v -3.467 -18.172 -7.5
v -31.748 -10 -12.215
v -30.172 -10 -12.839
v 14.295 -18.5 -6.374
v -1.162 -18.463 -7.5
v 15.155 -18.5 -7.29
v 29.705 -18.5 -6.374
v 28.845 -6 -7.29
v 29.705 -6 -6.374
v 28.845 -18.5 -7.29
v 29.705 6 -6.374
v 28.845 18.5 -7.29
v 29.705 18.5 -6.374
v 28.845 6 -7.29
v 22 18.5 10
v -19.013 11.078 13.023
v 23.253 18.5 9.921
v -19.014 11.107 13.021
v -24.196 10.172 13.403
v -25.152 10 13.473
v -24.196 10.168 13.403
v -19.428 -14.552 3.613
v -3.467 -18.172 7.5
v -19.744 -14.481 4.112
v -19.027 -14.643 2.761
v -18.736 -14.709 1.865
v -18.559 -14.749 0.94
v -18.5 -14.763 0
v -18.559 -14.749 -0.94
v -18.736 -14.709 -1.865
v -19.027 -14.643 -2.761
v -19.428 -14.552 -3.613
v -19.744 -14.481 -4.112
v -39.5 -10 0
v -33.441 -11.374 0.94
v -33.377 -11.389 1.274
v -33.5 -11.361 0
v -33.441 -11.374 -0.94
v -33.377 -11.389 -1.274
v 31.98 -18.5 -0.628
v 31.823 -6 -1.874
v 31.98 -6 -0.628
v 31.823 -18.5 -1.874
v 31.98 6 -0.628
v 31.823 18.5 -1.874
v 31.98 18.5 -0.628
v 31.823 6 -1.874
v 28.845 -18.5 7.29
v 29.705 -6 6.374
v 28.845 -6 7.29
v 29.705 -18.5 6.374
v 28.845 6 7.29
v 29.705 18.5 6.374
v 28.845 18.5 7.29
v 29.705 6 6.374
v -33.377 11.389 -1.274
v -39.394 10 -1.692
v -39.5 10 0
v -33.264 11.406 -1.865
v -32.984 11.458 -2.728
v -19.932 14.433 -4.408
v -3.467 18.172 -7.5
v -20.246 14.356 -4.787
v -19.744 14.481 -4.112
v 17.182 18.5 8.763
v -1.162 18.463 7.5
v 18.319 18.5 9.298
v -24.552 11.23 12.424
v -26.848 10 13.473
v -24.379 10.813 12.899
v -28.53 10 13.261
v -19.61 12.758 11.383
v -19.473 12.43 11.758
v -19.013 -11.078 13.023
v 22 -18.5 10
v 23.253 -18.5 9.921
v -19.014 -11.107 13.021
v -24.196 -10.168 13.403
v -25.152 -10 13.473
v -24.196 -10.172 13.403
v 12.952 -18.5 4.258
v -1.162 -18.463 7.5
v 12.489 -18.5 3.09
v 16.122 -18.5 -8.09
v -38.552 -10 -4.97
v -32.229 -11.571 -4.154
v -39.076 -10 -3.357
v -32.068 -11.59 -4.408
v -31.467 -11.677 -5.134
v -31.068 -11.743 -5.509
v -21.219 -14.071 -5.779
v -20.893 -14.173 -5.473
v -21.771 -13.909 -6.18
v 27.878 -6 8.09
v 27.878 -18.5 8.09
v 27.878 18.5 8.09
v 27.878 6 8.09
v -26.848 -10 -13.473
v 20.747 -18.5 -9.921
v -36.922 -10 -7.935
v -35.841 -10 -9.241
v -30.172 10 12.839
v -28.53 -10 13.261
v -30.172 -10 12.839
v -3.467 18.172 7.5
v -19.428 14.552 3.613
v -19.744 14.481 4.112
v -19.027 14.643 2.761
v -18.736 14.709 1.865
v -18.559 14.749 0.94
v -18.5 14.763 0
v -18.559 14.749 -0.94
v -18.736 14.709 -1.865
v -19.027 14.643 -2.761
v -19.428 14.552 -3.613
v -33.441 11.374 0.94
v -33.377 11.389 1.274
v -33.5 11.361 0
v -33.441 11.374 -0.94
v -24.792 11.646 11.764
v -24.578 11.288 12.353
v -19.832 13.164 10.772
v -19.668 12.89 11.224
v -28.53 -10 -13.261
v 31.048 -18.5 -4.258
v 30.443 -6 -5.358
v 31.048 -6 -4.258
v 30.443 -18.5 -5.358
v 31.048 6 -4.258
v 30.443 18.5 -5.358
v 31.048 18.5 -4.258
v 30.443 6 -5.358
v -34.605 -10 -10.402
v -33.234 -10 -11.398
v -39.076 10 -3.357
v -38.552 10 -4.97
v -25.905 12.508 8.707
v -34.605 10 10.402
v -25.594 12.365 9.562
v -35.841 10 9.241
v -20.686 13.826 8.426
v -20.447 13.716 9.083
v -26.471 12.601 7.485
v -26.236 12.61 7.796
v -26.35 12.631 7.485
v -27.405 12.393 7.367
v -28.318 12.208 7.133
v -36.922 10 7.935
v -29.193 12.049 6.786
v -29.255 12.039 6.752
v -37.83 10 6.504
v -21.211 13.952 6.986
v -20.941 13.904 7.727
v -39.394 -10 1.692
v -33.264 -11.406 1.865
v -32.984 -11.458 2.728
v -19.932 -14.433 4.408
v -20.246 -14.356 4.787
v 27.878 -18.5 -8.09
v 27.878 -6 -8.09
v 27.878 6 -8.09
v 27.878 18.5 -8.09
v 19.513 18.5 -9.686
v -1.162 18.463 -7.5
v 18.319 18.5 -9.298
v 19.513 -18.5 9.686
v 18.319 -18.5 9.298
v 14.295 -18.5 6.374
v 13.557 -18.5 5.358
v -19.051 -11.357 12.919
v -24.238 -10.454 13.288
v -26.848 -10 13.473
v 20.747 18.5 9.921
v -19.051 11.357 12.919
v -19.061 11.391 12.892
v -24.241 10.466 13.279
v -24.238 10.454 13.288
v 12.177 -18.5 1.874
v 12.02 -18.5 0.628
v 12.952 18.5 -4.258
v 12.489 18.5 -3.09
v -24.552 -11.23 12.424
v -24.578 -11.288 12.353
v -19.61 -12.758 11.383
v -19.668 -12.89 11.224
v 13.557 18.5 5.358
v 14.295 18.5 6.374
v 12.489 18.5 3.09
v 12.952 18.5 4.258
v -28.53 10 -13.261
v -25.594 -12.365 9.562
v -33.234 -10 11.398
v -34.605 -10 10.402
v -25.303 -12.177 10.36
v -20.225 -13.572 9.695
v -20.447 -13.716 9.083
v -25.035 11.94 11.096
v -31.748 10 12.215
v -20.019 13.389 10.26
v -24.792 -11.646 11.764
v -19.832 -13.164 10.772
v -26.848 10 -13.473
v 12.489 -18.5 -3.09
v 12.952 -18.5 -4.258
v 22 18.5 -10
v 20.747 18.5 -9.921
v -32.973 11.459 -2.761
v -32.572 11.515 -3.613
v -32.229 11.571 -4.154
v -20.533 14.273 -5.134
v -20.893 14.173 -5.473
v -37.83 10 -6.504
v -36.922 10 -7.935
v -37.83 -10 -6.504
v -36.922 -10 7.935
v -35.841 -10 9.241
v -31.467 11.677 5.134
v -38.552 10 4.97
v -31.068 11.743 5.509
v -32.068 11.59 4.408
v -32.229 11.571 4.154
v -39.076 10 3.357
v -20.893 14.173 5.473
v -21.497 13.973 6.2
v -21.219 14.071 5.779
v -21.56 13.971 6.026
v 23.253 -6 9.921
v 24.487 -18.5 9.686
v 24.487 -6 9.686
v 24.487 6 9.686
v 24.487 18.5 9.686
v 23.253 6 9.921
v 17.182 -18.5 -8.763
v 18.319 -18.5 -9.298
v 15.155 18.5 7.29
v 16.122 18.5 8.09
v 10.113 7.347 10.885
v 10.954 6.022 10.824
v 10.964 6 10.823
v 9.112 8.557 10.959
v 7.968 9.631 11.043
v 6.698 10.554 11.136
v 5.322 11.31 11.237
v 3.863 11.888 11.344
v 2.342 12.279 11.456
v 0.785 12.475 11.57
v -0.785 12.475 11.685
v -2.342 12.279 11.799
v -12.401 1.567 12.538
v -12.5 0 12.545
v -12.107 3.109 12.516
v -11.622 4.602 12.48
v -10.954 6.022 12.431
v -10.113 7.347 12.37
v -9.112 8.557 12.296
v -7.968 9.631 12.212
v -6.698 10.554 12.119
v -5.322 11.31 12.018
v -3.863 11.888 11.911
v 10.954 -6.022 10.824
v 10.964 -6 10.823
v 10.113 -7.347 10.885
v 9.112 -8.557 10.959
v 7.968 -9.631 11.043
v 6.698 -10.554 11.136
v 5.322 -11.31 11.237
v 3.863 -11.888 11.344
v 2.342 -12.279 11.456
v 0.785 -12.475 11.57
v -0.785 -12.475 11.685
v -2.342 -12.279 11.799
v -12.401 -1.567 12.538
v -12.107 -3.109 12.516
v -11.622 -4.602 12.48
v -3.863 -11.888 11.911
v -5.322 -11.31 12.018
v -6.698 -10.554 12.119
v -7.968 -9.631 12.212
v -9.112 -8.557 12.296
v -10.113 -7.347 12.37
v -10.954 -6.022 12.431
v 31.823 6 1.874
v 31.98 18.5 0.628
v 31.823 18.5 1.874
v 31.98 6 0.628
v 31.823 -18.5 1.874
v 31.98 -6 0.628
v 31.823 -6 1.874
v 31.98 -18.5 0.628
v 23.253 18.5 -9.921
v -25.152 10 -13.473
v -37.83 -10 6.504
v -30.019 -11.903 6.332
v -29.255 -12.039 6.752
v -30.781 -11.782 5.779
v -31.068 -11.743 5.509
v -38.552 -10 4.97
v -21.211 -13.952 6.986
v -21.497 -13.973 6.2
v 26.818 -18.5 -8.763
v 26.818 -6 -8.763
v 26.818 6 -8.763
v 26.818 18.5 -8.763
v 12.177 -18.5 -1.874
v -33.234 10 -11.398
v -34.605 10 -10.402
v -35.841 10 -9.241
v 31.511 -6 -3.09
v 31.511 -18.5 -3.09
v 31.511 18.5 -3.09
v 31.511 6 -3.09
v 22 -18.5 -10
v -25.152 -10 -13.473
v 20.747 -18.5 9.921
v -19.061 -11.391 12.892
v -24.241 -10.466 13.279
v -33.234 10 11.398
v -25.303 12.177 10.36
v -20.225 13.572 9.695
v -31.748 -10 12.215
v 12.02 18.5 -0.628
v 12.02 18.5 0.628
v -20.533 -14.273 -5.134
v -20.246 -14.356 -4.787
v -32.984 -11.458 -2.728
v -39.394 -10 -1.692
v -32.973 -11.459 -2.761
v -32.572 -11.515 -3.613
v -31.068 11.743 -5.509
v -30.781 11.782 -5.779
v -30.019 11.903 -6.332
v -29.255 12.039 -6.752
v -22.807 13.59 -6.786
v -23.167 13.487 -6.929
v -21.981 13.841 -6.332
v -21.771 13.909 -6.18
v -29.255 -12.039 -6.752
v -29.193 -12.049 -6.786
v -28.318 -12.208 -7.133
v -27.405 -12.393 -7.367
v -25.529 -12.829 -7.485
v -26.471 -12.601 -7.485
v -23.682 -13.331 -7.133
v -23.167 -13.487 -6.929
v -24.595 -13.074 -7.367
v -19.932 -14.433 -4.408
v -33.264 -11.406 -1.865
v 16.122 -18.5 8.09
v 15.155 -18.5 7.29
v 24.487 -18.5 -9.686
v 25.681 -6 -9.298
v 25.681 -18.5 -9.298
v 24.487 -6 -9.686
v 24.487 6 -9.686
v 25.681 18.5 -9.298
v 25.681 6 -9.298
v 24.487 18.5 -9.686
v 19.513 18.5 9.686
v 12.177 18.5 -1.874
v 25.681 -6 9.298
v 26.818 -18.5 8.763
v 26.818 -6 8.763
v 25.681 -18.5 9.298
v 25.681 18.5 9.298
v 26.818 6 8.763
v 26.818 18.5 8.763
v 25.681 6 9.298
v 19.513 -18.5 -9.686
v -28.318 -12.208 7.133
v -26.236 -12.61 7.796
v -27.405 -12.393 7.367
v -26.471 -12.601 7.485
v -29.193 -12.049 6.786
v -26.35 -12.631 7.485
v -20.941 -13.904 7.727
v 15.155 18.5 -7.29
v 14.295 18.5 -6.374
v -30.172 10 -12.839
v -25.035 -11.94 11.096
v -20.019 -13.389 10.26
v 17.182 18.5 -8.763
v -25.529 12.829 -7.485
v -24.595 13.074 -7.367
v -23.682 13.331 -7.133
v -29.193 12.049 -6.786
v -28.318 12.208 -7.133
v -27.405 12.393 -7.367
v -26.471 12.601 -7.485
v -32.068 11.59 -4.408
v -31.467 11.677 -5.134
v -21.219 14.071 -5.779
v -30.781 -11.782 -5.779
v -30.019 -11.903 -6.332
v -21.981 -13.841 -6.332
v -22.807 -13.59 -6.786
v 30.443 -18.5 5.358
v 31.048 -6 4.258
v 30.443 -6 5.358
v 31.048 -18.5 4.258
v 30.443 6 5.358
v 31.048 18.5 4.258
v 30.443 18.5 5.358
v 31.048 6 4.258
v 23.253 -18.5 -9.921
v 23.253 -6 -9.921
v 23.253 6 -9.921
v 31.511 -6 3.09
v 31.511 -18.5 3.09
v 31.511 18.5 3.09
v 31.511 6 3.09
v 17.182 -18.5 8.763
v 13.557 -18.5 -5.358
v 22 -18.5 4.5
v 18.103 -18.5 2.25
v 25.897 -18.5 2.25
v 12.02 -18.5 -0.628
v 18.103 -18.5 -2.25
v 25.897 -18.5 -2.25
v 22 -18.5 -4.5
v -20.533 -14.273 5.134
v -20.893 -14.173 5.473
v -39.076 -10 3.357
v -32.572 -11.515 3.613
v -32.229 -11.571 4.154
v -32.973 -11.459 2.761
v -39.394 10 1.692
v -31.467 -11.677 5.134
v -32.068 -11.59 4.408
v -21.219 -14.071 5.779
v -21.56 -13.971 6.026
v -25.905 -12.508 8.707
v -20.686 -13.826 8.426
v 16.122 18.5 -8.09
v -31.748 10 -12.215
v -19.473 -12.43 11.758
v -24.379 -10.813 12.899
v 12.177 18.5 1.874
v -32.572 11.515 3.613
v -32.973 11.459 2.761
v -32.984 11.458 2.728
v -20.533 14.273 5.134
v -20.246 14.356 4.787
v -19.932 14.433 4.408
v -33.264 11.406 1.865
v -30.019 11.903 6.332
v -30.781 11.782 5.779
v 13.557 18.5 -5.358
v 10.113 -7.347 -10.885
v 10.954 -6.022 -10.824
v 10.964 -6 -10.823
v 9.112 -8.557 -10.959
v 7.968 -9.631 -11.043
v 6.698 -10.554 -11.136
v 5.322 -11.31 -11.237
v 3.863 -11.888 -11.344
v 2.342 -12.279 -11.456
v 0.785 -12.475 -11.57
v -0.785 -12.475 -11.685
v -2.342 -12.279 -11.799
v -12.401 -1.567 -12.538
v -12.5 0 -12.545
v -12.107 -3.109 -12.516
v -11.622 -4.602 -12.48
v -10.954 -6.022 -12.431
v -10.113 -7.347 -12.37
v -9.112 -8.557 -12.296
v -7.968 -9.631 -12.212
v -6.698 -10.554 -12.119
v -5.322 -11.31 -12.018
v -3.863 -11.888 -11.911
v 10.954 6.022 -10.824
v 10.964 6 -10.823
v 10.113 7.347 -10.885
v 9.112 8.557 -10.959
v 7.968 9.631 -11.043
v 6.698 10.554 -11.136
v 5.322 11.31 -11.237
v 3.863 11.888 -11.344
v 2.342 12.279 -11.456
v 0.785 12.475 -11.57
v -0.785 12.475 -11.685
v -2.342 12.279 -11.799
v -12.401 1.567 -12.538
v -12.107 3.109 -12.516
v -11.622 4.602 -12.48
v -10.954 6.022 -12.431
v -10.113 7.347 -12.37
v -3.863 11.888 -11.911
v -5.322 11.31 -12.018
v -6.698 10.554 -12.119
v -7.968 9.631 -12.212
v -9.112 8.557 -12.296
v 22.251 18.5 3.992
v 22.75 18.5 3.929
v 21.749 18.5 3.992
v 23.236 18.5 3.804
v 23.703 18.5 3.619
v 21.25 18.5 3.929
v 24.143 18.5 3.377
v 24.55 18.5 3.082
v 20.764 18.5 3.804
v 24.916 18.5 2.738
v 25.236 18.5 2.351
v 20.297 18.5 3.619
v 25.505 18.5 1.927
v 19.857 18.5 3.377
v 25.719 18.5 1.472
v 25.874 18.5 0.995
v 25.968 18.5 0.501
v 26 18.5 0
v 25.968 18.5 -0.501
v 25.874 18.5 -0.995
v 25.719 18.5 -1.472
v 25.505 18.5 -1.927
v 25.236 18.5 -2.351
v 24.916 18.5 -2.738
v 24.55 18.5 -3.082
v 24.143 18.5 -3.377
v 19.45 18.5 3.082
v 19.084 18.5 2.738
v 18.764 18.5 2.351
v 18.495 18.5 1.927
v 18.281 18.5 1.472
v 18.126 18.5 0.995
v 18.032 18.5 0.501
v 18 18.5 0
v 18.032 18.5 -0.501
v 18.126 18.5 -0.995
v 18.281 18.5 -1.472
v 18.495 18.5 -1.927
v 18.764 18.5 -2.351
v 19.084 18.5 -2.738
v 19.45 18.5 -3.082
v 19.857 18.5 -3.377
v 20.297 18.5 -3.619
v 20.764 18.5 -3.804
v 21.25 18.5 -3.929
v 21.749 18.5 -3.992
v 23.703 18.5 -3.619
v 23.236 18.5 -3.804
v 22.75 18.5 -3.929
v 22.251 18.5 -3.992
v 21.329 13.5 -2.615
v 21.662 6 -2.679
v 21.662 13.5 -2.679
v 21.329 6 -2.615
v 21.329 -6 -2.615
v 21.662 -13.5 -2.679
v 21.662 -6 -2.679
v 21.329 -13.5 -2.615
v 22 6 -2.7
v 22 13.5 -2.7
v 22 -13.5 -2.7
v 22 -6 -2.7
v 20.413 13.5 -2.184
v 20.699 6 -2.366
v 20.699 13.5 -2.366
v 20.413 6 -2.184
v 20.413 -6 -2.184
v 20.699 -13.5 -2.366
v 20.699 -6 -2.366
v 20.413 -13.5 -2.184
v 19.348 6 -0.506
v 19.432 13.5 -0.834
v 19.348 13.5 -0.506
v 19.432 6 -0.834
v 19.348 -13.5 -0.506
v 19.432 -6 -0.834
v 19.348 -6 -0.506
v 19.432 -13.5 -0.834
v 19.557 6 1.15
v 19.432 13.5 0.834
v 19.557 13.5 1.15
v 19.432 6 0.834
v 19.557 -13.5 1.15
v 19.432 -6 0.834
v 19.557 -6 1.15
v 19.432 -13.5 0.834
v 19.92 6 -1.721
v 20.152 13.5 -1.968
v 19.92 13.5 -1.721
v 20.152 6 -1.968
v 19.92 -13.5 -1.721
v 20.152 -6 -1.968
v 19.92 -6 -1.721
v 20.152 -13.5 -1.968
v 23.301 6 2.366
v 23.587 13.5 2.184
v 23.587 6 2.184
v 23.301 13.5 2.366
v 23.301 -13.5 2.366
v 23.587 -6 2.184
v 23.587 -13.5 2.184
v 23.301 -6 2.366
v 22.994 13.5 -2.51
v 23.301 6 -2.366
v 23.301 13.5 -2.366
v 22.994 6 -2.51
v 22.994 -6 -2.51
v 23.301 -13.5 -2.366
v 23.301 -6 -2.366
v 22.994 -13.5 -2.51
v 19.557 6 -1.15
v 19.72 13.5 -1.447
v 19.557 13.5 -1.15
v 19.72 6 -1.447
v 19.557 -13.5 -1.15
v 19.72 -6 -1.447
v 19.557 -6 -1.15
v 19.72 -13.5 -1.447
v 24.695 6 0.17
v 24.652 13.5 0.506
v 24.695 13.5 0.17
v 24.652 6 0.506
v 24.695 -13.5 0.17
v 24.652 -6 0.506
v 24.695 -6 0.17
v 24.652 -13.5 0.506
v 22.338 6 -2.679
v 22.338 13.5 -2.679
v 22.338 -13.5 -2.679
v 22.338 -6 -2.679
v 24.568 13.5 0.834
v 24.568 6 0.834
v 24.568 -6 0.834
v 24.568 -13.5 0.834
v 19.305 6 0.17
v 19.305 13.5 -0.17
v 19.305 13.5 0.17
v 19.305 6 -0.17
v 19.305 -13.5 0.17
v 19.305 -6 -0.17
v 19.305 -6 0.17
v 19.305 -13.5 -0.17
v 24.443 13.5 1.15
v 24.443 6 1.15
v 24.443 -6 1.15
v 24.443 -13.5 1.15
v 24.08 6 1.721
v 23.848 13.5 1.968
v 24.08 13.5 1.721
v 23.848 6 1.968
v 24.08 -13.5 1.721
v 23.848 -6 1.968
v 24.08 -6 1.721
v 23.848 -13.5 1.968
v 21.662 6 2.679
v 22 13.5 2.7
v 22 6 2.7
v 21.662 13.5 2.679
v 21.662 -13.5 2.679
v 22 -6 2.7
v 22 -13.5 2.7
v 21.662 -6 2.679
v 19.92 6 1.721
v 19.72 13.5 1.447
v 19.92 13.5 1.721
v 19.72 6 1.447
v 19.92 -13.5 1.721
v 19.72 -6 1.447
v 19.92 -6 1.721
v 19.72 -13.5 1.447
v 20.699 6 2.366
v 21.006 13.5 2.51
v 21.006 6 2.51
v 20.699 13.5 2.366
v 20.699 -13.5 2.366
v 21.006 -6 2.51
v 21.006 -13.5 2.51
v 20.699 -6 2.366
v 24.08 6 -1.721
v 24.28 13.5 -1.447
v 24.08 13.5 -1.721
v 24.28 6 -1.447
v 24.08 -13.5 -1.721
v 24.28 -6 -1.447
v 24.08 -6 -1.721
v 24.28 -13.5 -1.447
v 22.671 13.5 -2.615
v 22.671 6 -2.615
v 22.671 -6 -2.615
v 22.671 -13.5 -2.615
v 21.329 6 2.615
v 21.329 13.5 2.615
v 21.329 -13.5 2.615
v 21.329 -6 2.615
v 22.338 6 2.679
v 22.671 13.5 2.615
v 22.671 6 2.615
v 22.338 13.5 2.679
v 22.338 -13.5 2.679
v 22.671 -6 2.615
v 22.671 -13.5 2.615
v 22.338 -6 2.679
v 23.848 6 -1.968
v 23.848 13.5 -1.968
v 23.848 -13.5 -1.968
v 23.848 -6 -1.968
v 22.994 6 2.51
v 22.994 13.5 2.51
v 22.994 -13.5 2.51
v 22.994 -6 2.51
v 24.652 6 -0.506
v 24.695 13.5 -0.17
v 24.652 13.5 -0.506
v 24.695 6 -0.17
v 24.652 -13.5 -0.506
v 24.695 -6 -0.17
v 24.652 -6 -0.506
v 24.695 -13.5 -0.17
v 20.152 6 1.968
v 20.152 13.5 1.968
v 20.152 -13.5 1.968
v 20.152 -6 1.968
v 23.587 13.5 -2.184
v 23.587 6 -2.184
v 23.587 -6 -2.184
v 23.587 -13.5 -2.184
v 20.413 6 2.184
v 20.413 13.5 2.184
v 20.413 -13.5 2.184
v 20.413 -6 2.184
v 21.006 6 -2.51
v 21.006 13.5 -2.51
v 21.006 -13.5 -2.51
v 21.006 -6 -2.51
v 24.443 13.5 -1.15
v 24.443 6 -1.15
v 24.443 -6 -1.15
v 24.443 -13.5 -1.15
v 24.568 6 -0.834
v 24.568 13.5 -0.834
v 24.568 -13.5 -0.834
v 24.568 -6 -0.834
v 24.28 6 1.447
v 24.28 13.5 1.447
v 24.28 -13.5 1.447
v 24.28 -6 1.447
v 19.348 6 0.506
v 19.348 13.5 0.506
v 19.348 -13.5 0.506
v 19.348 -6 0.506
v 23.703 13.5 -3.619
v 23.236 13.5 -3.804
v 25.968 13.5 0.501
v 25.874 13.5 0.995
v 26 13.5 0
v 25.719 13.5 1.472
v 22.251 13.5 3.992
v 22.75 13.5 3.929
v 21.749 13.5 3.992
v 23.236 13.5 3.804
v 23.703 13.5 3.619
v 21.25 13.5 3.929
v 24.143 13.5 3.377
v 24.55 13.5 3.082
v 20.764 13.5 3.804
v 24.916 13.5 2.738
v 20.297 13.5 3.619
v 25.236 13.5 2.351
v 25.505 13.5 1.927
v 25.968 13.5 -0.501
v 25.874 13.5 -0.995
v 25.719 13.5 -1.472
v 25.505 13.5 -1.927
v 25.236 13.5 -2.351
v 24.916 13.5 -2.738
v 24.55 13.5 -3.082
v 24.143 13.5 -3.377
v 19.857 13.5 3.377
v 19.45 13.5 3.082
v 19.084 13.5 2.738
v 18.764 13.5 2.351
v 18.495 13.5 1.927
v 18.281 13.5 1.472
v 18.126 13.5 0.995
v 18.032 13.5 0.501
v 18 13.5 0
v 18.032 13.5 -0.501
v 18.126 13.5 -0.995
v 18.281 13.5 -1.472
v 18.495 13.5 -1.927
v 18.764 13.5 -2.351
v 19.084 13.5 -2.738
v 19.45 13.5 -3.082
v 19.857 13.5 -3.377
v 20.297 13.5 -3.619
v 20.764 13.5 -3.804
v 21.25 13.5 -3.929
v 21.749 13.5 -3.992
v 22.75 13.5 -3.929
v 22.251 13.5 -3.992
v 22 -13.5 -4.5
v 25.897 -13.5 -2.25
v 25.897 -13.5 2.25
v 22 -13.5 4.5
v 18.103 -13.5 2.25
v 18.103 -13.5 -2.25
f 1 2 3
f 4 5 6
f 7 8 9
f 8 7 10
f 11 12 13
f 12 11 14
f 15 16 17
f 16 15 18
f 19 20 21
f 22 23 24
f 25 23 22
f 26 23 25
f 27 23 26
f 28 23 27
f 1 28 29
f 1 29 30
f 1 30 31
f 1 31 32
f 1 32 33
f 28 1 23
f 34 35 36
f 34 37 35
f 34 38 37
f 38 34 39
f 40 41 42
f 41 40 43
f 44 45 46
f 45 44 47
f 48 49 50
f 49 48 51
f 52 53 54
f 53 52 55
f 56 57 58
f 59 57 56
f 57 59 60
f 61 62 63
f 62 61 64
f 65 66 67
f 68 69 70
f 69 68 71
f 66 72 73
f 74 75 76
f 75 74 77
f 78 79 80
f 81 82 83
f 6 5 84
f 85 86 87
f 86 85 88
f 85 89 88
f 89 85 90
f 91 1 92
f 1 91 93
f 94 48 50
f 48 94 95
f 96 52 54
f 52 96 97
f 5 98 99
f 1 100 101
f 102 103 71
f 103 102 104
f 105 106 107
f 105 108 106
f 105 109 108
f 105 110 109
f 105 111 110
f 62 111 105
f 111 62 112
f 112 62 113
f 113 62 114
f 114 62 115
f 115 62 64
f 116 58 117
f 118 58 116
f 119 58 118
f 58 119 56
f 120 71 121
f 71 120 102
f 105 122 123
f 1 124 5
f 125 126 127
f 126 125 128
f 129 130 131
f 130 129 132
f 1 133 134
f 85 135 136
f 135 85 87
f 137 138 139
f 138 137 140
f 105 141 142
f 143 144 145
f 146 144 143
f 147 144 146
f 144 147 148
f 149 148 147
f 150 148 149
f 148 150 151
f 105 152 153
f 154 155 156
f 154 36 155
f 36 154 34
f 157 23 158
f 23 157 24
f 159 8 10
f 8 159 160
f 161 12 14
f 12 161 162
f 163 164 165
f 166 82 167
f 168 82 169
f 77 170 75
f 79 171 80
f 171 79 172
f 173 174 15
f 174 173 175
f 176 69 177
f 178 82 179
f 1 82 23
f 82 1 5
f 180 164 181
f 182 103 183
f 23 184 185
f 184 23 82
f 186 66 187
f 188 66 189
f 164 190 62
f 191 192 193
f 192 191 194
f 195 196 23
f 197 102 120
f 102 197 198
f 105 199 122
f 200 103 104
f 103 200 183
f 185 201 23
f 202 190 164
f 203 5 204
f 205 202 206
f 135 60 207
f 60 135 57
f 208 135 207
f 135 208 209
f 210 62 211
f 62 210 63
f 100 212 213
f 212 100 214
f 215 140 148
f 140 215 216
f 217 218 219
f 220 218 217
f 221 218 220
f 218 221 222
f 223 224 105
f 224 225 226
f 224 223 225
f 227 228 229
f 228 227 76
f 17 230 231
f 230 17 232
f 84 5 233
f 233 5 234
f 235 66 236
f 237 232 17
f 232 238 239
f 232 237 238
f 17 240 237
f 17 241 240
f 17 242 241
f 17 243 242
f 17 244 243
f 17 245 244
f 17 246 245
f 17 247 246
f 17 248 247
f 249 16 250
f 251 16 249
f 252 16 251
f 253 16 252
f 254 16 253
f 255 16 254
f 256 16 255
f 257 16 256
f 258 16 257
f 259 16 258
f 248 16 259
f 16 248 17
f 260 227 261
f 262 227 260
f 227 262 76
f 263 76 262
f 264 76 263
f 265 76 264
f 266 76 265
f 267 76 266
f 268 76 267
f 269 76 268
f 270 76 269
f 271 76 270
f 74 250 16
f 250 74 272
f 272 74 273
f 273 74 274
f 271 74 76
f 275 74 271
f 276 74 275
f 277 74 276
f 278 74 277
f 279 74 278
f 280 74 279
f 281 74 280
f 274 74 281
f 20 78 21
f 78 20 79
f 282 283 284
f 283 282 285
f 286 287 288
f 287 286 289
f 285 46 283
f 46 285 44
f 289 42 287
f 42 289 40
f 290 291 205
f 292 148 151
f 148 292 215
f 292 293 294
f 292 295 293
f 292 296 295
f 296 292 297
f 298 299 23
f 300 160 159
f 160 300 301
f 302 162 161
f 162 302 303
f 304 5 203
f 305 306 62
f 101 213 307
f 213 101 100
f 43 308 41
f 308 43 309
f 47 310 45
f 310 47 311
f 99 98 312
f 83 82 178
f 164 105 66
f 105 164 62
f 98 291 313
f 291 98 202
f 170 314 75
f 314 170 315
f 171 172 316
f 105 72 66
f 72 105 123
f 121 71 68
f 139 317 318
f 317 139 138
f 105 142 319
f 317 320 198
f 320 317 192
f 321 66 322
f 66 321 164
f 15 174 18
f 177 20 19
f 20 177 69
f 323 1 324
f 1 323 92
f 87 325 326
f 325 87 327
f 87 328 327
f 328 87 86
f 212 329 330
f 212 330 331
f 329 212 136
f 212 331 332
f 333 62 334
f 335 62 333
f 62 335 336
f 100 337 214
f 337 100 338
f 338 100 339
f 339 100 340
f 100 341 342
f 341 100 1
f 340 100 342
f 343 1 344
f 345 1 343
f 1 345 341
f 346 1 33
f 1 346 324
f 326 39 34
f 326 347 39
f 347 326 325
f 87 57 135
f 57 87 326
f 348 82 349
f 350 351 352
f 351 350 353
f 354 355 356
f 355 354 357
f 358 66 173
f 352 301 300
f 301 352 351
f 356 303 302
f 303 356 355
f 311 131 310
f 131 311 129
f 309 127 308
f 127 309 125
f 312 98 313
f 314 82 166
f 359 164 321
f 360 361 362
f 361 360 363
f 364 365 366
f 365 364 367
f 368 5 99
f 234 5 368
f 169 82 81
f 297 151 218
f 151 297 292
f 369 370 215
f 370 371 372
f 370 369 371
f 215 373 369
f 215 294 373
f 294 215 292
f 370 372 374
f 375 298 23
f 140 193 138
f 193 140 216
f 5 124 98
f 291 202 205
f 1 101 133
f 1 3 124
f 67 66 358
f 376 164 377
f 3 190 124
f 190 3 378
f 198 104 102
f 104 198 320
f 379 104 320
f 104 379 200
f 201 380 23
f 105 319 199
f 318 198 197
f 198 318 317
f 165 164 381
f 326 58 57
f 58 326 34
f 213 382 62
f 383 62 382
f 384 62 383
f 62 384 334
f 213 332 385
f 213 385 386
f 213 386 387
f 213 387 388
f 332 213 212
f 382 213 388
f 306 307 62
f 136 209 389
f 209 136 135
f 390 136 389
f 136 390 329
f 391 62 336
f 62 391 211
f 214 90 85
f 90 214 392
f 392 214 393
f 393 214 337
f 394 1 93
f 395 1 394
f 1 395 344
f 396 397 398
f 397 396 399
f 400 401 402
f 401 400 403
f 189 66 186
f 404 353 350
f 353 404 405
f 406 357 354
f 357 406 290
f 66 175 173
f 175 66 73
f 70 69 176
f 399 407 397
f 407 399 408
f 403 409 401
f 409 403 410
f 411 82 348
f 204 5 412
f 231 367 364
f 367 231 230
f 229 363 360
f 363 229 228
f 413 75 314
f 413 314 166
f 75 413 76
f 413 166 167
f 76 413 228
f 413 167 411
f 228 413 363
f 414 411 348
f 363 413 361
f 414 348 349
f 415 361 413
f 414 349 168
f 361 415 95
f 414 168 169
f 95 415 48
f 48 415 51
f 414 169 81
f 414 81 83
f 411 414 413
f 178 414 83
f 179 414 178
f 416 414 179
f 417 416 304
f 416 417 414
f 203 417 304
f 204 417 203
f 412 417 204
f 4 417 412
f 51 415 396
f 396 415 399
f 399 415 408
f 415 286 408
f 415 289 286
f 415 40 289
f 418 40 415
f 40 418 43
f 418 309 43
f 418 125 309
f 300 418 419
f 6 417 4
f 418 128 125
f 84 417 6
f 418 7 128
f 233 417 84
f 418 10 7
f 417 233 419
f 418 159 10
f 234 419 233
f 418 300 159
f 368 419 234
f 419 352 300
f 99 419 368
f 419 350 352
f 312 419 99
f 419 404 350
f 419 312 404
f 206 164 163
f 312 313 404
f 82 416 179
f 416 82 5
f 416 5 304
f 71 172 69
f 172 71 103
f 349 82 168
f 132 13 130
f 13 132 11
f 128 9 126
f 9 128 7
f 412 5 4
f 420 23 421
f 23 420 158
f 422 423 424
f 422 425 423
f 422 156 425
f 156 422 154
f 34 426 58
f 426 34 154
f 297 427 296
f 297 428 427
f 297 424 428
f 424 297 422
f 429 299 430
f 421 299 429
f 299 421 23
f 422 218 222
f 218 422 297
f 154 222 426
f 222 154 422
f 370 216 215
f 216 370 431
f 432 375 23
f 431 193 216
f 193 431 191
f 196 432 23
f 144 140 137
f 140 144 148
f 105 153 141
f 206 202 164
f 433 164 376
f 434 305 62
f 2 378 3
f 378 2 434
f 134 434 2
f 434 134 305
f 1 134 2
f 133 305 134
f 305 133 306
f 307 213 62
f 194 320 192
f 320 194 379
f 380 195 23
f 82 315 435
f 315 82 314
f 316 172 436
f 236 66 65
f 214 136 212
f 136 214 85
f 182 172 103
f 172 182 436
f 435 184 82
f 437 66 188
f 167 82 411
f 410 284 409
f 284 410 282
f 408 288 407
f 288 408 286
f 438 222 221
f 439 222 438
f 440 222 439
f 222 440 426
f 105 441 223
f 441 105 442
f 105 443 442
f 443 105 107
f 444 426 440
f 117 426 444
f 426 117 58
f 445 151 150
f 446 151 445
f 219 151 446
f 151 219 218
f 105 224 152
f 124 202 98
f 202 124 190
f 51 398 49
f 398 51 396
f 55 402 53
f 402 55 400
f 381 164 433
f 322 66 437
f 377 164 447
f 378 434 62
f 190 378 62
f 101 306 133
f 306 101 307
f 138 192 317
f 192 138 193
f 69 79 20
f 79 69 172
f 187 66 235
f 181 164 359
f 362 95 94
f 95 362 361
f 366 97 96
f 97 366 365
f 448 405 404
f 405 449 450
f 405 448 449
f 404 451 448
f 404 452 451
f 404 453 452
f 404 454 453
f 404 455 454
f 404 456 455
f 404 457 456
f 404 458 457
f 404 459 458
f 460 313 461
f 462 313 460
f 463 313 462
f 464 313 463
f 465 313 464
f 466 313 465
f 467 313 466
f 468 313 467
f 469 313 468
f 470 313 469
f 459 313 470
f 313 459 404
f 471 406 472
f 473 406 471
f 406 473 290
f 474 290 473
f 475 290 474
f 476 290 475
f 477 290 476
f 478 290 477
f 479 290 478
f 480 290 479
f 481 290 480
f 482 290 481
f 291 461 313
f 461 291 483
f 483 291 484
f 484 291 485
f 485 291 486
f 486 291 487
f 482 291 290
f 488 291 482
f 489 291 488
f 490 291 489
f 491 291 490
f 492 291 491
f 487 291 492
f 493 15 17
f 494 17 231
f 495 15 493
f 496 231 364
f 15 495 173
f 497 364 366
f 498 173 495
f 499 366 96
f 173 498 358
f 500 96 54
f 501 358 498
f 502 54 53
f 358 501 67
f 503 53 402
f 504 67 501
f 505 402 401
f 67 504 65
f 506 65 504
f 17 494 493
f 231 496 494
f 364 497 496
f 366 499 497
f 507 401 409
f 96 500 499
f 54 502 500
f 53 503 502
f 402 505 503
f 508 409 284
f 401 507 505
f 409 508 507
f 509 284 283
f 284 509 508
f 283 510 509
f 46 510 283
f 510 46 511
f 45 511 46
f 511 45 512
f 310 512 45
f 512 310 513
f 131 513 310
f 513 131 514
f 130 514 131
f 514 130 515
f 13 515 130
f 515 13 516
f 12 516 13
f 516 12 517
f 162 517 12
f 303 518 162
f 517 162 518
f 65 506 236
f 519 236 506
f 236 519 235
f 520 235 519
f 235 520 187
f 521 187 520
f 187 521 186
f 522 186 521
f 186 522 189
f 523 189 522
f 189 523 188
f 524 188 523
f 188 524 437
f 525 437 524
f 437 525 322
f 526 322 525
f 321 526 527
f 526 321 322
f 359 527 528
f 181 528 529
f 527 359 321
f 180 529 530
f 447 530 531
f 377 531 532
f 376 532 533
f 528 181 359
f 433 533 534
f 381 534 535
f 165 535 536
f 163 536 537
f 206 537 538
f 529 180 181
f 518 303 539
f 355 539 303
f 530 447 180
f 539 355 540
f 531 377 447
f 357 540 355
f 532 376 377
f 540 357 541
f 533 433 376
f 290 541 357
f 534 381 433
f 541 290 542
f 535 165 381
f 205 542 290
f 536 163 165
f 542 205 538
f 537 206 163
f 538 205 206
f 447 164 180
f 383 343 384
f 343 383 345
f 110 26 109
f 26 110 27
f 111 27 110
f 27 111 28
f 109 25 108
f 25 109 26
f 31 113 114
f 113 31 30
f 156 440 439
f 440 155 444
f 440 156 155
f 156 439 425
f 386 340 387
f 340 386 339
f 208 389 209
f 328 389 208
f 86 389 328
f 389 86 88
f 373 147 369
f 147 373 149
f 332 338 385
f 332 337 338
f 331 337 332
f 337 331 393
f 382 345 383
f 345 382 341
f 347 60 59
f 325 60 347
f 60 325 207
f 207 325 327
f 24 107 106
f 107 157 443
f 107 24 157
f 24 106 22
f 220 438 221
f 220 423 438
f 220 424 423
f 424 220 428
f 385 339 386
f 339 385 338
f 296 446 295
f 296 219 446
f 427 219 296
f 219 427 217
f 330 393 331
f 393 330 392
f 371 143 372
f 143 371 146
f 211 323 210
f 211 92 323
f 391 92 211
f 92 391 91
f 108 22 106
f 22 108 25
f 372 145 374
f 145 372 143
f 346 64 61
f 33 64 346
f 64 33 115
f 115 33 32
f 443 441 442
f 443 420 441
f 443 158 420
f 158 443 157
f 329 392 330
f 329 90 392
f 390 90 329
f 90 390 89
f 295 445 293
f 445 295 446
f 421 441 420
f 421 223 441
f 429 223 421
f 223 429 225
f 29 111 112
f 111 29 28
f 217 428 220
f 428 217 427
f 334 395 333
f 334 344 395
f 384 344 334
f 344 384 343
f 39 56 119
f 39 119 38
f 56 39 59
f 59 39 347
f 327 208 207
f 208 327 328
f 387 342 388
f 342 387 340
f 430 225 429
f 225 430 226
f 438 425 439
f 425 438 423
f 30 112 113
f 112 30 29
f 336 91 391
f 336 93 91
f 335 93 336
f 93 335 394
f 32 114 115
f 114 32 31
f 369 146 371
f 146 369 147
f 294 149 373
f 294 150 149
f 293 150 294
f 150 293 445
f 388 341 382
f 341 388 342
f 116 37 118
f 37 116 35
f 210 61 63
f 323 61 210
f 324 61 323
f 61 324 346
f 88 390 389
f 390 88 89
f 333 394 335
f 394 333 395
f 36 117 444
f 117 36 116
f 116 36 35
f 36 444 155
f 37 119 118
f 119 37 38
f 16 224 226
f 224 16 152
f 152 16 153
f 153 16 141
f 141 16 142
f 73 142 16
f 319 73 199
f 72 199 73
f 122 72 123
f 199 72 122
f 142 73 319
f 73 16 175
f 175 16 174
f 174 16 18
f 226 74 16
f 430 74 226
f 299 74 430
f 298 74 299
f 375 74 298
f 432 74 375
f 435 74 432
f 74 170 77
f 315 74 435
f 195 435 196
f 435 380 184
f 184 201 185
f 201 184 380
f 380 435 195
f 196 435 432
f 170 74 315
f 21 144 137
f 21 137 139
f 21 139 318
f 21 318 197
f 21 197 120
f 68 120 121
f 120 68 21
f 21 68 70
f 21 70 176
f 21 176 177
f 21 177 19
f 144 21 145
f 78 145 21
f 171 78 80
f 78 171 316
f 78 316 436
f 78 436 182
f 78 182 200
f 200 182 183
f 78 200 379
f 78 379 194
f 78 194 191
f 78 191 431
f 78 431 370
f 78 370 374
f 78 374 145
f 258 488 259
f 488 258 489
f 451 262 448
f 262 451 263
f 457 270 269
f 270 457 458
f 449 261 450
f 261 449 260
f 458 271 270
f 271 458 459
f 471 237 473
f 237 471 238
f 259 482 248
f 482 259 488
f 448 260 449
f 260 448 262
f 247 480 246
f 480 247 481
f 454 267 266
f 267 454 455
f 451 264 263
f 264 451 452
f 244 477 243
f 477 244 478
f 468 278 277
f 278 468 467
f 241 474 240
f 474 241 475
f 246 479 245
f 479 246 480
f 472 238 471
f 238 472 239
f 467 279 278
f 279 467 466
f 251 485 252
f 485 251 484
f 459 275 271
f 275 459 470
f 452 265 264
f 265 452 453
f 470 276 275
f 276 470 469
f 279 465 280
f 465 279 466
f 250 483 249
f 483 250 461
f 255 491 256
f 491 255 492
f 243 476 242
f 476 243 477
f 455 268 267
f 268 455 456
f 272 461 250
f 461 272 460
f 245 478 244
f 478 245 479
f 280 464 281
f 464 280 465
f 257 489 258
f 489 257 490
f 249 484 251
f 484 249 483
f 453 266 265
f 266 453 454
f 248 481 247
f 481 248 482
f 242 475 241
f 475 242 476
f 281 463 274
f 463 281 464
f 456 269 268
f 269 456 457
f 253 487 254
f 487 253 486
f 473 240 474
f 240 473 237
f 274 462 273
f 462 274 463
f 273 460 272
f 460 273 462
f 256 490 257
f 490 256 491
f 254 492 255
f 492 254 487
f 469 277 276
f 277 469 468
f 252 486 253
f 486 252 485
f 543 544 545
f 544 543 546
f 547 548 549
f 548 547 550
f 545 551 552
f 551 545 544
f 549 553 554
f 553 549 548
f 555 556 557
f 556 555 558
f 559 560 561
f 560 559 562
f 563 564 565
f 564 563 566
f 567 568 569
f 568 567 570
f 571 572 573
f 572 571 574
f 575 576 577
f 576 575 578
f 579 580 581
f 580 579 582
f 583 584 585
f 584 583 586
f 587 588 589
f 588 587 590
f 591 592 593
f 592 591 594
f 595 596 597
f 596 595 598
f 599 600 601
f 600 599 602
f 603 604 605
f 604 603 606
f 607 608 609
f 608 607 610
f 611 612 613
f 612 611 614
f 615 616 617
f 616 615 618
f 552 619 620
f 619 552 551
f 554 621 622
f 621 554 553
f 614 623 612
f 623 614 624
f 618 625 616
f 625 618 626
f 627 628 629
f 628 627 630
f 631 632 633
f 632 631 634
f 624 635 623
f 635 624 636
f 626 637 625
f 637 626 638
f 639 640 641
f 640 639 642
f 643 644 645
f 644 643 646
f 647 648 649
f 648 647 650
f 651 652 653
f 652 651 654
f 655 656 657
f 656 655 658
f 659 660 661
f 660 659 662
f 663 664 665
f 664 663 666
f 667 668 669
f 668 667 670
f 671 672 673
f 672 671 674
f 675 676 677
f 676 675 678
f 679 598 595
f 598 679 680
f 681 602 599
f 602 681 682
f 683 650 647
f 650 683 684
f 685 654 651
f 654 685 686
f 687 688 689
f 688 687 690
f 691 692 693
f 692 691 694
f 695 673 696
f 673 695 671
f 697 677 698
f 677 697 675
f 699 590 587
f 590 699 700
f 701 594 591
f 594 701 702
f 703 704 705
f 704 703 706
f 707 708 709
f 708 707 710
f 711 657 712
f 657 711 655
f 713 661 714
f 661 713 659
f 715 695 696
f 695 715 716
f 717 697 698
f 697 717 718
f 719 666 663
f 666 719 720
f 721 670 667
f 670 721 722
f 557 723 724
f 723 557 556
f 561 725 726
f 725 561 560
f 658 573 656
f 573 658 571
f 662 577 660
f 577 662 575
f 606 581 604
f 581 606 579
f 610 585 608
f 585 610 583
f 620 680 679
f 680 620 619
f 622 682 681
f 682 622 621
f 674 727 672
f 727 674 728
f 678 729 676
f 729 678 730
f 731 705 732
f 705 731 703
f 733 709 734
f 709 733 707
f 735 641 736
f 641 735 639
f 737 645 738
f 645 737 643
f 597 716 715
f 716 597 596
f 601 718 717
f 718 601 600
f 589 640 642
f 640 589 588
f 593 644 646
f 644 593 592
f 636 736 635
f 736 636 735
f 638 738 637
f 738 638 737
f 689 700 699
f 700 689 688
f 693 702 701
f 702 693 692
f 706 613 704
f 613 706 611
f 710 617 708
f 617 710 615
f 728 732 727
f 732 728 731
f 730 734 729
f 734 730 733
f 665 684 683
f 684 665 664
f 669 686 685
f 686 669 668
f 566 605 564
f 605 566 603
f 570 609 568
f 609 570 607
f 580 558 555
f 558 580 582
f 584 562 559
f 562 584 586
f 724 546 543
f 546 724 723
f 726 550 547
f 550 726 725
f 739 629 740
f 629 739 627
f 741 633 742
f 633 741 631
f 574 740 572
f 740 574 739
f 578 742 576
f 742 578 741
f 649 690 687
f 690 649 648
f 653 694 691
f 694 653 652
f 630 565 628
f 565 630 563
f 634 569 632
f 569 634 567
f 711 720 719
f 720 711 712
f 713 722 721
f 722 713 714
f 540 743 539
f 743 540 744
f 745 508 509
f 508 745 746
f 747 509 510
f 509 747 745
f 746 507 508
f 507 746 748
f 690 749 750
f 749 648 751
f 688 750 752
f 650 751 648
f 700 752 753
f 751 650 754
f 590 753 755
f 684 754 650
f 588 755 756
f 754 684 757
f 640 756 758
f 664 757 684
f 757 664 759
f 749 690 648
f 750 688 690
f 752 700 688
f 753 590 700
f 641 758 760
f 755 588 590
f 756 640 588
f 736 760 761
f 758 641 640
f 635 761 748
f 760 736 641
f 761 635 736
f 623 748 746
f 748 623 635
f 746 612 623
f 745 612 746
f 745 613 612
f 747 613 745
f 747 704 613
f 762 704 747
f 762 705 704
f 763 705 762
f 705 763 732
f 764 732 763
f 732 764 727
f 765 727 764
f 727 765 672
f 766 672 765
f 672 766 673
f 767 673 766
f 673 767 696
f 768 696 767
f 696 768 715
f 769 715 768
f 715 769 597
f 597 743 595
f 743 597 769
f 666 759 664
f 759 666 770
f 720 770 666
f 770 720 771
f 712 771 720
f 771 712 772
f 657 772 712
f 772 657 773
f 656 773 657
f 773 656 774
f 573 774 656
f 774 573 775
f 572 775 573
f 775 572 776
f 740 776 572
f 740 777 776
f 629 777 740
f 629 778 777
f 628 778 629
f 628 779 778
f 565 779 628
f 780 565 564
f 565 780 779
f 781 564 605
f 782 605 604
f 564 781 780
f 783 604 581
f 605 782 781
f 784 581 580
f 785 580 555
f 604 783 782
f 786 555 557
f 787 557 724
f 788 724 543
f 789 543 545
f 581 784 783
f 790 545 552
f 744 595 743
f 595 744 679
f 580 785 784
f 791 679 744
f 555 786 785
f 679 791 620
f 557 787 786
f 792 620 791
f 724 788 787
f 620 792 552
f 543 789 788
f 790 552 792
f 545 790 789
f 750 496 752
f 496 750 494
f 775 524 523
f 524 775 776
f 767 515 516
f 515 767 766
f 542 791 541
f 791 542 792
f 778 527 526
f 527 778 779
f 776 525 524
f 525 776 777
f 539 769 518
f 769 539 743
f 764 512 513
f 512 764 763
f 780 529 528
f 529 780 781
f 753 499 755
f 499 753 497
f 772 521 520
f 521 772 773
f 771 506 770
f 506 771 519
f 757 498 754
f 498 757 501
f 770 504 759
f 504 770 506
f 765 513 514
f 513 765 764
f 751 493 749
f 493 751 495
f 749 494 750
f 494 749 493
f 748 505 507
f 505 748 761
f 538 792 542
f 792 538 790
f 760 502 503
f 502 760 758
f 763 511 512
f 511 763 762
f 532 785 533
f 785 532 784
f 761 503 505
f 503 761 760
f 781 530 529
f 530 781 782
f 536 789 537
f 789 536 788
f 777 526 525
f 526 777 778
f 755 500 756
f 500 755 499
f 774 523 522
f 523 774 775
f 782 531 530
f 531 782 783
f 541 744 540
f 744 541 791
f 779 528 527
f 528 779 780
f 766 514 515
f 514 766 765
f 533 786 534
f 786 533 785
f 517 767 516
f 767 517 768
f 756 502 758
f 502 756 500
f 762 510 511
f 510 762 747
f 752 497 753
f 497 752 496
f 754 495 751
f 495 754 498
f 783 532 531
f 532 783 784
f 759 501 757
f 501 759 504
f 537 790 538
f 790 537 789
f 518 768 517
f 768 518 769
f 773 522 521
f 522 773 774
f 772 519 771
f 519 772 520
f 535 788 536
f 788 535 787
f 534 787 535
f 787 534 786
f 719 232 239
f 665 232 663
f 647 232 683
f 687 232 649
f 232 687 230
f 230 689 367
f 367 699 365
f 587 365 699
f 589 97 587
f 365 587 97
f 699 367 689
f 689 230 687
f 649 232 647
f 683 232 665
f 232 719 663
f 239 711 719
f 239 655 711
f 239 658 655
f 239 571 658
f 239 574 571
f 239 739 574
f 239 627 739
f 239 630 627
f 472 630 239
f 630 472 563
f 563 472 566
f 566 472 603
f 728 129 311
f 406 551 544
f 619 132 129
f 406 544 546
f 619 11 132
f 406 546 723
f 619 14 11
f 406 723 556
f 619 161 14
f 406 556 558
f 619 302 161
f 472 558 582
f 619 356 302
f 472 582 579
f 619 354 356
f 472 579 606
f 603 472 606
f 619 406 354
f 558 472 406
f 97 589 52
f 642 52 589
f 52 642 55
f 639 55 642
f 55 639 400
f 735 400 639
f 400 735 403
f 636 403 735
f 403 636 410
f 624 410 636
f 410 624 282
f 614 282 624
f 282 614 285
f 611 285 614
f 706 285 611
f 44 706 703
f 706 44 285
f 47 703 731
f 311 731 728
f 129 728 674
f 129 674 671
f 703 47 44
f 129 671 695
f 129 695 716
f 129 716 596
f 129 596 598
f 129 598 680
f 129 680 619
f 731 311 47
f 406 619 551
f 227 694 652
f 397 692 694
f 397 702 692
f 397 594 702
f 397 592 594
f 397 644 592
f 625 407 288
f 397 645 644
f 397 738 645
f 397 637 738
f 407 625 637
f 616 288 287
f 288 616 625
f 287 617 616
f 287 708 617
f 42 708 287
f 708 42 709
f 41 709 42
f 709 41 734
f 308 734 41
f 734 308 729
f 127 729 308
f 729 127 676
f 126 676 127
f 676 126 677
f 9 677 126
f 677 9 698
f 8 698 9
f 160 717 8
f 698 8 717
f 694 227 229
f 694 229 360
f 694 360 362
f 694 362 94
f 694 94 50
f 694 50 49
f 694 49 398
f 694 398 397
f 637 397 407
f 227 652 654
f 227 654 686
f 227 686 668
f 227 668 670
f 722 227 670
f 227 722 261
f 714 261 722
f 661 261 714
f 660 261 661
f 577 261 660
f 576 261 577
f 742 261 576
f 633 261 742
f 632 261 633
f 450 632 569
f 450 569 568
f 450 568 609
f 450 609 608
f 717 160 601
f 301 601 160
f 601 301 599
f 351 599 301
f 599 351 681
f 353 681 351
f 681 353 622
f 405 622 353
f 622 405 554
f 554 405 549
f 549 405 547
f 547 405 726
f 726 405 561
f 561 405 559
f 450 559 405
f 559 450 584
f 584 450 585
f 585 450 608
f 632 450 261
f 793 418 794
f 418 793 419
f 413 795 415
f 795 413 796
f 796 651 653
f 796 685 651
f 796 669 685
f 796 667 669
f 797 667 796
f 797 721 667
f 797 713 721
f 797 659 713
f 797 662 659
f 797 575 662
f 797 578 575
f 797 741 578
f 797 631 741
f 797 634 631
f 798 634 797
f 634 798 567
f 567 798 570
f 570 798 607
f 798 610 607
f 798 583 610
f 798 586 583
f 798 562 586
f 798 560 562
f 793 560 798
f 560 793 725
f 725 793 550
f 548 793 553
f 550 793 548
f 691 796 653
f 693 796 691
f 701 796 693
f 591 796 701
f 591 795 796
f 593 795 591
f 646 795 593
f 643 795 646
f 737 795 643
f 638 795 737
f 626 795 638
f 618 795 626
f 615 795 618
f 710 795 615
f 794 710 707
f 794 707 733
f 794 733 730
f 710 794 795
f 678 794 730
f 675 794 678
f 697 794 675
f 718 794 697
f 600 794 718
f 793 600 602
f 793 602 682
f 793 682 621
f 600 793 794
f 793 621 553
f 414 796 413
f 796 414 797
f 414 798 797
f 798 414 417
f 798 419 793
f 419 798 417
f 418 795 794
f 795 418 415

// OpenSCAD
//////////////////////////  Soporte para Carrito / Maleta  //////////////////////////


////////////// Creado por Luis Rodríguez para la Fundación ONCE - 2019 /////////////



//Este software se distribuye bajo licencia Creative Commons - Attribution - NonCommercial - ShareAlike license.
//https://creativecommons.org/licenses/by-nc-sa/4.0/
//Este software no tiene ningún tipo de garantía y el usuario será el único responsable de su uso



//////// Este Soporte está pensado para poder sujetar un bolso pequeño tanto por delante como por detrás de las piernas de la persona dependiendo de la orientación con la que se fijen los soportes ////////


/////////////// Todos los parámetros están medidos en milímetros ///////////////


/////////////////////////////////////////////////////////////////////////////////////

/*[Parámetros]*/


//Diámetro del tubo de la silla de ruedas a donde se va a fijar el soporte
Diametro = 25;      //[20:1:35]

//Anchura del soporte
Ancho = 20;         //[15:1:40]

//Grosor de las paredes del soporte
Grosor = 6;         //[5:0.5:10]

//Diámetro del tornillo que se va a utilizar
Tornillo = 5;       //[4:1:6]

//Diámetro de la cabeza del tornillo
Cabeza = 8;         //[6:1:12]

//Diámetro de la tuerca hexagonal que se va a utilizar (en su parte más ancha)
Tuerca = 9;         //[5:1:12]

//Hueco necesario para que quede recogida la correa del bolso
Hueco_Bolso = 15;   //[10:1:30]

//Separación entre la mordaza y el enganche del bolso
Separacion = 0;    //[0:5:25]




/*[Hidden]*/

Tubo = Diametro/2;
Bolso = Hueco_Bolso/2;



/////////////////////////////////// Módulos ///////////////////////////////////


module Mordaza() {
hull() {
    cylinder(Hueco_Bolso,Tubo+Grosor,Tubo+Grosor,$fn=50,center=true);
        translate([Diametro-Grosor/2,0,0])
        rotate([0,90,90])
            cylinder(Diametro+Grosor*2,Tuerca+1,Tuerca+1,$fn=50,center=true);
        }
                 }


module Bol() {
translate([-Tubo-Hueco_Bolso/2-Grosor-Separacion,0,0])
    rotate([90,0,0])
    cylinder(Ancho,Bolso+Grosor,Bolso+Grosor,$fn=50,center=true);
                  }


module Base() {
hull() {
    Mordaza();
    Bol();
        }
               }


difference() {
Base();
    
    rotate([90,0,0])
    translate([-Tubo-Hueco_Bolso/2-Grosor-Separacion,0,0])
        cylinder(Ancho+20,Bolso,Bolso,$fn=50,center=true);


    translate([-Tubo-Hueco_Bolso/2-Separacion-Grosor/4,0,Bolso+6])
    rotate([0,20,0])
        cube([Bolso/1.5,Diametro*2,Ancho+1],center=true);


    cylinder(Ancho+45,Tubo,Tubo,$fn=50,center=true);

    translate([Diametro-Grosor/2,0,0])
    rotate([0,90,90])
        cylinder(Diametro+Grosor*4+1,Tornillo/2+0.2,Tornillo/2+0.2,$fn=50,center=true);

    rotate([90,0,0])
    translate([Diametro-Grosor/2,0,-Tubo-Grosor])
        cylinder(10,Cabeza/2,Cabeza/2,$fn=50,center=true);

    translate([Diametro,0,0])
        cube([Diametro+Grosor*2,Grosor*2,Ancho+25],center=true);

    rotate([90,90,0])
    translate([0,Diametro-Grosor/2,+Tubo+Grosor])
        cylinder(10,Tuerca/2,Tuerca/2,$fn=6,center=true);

             }
